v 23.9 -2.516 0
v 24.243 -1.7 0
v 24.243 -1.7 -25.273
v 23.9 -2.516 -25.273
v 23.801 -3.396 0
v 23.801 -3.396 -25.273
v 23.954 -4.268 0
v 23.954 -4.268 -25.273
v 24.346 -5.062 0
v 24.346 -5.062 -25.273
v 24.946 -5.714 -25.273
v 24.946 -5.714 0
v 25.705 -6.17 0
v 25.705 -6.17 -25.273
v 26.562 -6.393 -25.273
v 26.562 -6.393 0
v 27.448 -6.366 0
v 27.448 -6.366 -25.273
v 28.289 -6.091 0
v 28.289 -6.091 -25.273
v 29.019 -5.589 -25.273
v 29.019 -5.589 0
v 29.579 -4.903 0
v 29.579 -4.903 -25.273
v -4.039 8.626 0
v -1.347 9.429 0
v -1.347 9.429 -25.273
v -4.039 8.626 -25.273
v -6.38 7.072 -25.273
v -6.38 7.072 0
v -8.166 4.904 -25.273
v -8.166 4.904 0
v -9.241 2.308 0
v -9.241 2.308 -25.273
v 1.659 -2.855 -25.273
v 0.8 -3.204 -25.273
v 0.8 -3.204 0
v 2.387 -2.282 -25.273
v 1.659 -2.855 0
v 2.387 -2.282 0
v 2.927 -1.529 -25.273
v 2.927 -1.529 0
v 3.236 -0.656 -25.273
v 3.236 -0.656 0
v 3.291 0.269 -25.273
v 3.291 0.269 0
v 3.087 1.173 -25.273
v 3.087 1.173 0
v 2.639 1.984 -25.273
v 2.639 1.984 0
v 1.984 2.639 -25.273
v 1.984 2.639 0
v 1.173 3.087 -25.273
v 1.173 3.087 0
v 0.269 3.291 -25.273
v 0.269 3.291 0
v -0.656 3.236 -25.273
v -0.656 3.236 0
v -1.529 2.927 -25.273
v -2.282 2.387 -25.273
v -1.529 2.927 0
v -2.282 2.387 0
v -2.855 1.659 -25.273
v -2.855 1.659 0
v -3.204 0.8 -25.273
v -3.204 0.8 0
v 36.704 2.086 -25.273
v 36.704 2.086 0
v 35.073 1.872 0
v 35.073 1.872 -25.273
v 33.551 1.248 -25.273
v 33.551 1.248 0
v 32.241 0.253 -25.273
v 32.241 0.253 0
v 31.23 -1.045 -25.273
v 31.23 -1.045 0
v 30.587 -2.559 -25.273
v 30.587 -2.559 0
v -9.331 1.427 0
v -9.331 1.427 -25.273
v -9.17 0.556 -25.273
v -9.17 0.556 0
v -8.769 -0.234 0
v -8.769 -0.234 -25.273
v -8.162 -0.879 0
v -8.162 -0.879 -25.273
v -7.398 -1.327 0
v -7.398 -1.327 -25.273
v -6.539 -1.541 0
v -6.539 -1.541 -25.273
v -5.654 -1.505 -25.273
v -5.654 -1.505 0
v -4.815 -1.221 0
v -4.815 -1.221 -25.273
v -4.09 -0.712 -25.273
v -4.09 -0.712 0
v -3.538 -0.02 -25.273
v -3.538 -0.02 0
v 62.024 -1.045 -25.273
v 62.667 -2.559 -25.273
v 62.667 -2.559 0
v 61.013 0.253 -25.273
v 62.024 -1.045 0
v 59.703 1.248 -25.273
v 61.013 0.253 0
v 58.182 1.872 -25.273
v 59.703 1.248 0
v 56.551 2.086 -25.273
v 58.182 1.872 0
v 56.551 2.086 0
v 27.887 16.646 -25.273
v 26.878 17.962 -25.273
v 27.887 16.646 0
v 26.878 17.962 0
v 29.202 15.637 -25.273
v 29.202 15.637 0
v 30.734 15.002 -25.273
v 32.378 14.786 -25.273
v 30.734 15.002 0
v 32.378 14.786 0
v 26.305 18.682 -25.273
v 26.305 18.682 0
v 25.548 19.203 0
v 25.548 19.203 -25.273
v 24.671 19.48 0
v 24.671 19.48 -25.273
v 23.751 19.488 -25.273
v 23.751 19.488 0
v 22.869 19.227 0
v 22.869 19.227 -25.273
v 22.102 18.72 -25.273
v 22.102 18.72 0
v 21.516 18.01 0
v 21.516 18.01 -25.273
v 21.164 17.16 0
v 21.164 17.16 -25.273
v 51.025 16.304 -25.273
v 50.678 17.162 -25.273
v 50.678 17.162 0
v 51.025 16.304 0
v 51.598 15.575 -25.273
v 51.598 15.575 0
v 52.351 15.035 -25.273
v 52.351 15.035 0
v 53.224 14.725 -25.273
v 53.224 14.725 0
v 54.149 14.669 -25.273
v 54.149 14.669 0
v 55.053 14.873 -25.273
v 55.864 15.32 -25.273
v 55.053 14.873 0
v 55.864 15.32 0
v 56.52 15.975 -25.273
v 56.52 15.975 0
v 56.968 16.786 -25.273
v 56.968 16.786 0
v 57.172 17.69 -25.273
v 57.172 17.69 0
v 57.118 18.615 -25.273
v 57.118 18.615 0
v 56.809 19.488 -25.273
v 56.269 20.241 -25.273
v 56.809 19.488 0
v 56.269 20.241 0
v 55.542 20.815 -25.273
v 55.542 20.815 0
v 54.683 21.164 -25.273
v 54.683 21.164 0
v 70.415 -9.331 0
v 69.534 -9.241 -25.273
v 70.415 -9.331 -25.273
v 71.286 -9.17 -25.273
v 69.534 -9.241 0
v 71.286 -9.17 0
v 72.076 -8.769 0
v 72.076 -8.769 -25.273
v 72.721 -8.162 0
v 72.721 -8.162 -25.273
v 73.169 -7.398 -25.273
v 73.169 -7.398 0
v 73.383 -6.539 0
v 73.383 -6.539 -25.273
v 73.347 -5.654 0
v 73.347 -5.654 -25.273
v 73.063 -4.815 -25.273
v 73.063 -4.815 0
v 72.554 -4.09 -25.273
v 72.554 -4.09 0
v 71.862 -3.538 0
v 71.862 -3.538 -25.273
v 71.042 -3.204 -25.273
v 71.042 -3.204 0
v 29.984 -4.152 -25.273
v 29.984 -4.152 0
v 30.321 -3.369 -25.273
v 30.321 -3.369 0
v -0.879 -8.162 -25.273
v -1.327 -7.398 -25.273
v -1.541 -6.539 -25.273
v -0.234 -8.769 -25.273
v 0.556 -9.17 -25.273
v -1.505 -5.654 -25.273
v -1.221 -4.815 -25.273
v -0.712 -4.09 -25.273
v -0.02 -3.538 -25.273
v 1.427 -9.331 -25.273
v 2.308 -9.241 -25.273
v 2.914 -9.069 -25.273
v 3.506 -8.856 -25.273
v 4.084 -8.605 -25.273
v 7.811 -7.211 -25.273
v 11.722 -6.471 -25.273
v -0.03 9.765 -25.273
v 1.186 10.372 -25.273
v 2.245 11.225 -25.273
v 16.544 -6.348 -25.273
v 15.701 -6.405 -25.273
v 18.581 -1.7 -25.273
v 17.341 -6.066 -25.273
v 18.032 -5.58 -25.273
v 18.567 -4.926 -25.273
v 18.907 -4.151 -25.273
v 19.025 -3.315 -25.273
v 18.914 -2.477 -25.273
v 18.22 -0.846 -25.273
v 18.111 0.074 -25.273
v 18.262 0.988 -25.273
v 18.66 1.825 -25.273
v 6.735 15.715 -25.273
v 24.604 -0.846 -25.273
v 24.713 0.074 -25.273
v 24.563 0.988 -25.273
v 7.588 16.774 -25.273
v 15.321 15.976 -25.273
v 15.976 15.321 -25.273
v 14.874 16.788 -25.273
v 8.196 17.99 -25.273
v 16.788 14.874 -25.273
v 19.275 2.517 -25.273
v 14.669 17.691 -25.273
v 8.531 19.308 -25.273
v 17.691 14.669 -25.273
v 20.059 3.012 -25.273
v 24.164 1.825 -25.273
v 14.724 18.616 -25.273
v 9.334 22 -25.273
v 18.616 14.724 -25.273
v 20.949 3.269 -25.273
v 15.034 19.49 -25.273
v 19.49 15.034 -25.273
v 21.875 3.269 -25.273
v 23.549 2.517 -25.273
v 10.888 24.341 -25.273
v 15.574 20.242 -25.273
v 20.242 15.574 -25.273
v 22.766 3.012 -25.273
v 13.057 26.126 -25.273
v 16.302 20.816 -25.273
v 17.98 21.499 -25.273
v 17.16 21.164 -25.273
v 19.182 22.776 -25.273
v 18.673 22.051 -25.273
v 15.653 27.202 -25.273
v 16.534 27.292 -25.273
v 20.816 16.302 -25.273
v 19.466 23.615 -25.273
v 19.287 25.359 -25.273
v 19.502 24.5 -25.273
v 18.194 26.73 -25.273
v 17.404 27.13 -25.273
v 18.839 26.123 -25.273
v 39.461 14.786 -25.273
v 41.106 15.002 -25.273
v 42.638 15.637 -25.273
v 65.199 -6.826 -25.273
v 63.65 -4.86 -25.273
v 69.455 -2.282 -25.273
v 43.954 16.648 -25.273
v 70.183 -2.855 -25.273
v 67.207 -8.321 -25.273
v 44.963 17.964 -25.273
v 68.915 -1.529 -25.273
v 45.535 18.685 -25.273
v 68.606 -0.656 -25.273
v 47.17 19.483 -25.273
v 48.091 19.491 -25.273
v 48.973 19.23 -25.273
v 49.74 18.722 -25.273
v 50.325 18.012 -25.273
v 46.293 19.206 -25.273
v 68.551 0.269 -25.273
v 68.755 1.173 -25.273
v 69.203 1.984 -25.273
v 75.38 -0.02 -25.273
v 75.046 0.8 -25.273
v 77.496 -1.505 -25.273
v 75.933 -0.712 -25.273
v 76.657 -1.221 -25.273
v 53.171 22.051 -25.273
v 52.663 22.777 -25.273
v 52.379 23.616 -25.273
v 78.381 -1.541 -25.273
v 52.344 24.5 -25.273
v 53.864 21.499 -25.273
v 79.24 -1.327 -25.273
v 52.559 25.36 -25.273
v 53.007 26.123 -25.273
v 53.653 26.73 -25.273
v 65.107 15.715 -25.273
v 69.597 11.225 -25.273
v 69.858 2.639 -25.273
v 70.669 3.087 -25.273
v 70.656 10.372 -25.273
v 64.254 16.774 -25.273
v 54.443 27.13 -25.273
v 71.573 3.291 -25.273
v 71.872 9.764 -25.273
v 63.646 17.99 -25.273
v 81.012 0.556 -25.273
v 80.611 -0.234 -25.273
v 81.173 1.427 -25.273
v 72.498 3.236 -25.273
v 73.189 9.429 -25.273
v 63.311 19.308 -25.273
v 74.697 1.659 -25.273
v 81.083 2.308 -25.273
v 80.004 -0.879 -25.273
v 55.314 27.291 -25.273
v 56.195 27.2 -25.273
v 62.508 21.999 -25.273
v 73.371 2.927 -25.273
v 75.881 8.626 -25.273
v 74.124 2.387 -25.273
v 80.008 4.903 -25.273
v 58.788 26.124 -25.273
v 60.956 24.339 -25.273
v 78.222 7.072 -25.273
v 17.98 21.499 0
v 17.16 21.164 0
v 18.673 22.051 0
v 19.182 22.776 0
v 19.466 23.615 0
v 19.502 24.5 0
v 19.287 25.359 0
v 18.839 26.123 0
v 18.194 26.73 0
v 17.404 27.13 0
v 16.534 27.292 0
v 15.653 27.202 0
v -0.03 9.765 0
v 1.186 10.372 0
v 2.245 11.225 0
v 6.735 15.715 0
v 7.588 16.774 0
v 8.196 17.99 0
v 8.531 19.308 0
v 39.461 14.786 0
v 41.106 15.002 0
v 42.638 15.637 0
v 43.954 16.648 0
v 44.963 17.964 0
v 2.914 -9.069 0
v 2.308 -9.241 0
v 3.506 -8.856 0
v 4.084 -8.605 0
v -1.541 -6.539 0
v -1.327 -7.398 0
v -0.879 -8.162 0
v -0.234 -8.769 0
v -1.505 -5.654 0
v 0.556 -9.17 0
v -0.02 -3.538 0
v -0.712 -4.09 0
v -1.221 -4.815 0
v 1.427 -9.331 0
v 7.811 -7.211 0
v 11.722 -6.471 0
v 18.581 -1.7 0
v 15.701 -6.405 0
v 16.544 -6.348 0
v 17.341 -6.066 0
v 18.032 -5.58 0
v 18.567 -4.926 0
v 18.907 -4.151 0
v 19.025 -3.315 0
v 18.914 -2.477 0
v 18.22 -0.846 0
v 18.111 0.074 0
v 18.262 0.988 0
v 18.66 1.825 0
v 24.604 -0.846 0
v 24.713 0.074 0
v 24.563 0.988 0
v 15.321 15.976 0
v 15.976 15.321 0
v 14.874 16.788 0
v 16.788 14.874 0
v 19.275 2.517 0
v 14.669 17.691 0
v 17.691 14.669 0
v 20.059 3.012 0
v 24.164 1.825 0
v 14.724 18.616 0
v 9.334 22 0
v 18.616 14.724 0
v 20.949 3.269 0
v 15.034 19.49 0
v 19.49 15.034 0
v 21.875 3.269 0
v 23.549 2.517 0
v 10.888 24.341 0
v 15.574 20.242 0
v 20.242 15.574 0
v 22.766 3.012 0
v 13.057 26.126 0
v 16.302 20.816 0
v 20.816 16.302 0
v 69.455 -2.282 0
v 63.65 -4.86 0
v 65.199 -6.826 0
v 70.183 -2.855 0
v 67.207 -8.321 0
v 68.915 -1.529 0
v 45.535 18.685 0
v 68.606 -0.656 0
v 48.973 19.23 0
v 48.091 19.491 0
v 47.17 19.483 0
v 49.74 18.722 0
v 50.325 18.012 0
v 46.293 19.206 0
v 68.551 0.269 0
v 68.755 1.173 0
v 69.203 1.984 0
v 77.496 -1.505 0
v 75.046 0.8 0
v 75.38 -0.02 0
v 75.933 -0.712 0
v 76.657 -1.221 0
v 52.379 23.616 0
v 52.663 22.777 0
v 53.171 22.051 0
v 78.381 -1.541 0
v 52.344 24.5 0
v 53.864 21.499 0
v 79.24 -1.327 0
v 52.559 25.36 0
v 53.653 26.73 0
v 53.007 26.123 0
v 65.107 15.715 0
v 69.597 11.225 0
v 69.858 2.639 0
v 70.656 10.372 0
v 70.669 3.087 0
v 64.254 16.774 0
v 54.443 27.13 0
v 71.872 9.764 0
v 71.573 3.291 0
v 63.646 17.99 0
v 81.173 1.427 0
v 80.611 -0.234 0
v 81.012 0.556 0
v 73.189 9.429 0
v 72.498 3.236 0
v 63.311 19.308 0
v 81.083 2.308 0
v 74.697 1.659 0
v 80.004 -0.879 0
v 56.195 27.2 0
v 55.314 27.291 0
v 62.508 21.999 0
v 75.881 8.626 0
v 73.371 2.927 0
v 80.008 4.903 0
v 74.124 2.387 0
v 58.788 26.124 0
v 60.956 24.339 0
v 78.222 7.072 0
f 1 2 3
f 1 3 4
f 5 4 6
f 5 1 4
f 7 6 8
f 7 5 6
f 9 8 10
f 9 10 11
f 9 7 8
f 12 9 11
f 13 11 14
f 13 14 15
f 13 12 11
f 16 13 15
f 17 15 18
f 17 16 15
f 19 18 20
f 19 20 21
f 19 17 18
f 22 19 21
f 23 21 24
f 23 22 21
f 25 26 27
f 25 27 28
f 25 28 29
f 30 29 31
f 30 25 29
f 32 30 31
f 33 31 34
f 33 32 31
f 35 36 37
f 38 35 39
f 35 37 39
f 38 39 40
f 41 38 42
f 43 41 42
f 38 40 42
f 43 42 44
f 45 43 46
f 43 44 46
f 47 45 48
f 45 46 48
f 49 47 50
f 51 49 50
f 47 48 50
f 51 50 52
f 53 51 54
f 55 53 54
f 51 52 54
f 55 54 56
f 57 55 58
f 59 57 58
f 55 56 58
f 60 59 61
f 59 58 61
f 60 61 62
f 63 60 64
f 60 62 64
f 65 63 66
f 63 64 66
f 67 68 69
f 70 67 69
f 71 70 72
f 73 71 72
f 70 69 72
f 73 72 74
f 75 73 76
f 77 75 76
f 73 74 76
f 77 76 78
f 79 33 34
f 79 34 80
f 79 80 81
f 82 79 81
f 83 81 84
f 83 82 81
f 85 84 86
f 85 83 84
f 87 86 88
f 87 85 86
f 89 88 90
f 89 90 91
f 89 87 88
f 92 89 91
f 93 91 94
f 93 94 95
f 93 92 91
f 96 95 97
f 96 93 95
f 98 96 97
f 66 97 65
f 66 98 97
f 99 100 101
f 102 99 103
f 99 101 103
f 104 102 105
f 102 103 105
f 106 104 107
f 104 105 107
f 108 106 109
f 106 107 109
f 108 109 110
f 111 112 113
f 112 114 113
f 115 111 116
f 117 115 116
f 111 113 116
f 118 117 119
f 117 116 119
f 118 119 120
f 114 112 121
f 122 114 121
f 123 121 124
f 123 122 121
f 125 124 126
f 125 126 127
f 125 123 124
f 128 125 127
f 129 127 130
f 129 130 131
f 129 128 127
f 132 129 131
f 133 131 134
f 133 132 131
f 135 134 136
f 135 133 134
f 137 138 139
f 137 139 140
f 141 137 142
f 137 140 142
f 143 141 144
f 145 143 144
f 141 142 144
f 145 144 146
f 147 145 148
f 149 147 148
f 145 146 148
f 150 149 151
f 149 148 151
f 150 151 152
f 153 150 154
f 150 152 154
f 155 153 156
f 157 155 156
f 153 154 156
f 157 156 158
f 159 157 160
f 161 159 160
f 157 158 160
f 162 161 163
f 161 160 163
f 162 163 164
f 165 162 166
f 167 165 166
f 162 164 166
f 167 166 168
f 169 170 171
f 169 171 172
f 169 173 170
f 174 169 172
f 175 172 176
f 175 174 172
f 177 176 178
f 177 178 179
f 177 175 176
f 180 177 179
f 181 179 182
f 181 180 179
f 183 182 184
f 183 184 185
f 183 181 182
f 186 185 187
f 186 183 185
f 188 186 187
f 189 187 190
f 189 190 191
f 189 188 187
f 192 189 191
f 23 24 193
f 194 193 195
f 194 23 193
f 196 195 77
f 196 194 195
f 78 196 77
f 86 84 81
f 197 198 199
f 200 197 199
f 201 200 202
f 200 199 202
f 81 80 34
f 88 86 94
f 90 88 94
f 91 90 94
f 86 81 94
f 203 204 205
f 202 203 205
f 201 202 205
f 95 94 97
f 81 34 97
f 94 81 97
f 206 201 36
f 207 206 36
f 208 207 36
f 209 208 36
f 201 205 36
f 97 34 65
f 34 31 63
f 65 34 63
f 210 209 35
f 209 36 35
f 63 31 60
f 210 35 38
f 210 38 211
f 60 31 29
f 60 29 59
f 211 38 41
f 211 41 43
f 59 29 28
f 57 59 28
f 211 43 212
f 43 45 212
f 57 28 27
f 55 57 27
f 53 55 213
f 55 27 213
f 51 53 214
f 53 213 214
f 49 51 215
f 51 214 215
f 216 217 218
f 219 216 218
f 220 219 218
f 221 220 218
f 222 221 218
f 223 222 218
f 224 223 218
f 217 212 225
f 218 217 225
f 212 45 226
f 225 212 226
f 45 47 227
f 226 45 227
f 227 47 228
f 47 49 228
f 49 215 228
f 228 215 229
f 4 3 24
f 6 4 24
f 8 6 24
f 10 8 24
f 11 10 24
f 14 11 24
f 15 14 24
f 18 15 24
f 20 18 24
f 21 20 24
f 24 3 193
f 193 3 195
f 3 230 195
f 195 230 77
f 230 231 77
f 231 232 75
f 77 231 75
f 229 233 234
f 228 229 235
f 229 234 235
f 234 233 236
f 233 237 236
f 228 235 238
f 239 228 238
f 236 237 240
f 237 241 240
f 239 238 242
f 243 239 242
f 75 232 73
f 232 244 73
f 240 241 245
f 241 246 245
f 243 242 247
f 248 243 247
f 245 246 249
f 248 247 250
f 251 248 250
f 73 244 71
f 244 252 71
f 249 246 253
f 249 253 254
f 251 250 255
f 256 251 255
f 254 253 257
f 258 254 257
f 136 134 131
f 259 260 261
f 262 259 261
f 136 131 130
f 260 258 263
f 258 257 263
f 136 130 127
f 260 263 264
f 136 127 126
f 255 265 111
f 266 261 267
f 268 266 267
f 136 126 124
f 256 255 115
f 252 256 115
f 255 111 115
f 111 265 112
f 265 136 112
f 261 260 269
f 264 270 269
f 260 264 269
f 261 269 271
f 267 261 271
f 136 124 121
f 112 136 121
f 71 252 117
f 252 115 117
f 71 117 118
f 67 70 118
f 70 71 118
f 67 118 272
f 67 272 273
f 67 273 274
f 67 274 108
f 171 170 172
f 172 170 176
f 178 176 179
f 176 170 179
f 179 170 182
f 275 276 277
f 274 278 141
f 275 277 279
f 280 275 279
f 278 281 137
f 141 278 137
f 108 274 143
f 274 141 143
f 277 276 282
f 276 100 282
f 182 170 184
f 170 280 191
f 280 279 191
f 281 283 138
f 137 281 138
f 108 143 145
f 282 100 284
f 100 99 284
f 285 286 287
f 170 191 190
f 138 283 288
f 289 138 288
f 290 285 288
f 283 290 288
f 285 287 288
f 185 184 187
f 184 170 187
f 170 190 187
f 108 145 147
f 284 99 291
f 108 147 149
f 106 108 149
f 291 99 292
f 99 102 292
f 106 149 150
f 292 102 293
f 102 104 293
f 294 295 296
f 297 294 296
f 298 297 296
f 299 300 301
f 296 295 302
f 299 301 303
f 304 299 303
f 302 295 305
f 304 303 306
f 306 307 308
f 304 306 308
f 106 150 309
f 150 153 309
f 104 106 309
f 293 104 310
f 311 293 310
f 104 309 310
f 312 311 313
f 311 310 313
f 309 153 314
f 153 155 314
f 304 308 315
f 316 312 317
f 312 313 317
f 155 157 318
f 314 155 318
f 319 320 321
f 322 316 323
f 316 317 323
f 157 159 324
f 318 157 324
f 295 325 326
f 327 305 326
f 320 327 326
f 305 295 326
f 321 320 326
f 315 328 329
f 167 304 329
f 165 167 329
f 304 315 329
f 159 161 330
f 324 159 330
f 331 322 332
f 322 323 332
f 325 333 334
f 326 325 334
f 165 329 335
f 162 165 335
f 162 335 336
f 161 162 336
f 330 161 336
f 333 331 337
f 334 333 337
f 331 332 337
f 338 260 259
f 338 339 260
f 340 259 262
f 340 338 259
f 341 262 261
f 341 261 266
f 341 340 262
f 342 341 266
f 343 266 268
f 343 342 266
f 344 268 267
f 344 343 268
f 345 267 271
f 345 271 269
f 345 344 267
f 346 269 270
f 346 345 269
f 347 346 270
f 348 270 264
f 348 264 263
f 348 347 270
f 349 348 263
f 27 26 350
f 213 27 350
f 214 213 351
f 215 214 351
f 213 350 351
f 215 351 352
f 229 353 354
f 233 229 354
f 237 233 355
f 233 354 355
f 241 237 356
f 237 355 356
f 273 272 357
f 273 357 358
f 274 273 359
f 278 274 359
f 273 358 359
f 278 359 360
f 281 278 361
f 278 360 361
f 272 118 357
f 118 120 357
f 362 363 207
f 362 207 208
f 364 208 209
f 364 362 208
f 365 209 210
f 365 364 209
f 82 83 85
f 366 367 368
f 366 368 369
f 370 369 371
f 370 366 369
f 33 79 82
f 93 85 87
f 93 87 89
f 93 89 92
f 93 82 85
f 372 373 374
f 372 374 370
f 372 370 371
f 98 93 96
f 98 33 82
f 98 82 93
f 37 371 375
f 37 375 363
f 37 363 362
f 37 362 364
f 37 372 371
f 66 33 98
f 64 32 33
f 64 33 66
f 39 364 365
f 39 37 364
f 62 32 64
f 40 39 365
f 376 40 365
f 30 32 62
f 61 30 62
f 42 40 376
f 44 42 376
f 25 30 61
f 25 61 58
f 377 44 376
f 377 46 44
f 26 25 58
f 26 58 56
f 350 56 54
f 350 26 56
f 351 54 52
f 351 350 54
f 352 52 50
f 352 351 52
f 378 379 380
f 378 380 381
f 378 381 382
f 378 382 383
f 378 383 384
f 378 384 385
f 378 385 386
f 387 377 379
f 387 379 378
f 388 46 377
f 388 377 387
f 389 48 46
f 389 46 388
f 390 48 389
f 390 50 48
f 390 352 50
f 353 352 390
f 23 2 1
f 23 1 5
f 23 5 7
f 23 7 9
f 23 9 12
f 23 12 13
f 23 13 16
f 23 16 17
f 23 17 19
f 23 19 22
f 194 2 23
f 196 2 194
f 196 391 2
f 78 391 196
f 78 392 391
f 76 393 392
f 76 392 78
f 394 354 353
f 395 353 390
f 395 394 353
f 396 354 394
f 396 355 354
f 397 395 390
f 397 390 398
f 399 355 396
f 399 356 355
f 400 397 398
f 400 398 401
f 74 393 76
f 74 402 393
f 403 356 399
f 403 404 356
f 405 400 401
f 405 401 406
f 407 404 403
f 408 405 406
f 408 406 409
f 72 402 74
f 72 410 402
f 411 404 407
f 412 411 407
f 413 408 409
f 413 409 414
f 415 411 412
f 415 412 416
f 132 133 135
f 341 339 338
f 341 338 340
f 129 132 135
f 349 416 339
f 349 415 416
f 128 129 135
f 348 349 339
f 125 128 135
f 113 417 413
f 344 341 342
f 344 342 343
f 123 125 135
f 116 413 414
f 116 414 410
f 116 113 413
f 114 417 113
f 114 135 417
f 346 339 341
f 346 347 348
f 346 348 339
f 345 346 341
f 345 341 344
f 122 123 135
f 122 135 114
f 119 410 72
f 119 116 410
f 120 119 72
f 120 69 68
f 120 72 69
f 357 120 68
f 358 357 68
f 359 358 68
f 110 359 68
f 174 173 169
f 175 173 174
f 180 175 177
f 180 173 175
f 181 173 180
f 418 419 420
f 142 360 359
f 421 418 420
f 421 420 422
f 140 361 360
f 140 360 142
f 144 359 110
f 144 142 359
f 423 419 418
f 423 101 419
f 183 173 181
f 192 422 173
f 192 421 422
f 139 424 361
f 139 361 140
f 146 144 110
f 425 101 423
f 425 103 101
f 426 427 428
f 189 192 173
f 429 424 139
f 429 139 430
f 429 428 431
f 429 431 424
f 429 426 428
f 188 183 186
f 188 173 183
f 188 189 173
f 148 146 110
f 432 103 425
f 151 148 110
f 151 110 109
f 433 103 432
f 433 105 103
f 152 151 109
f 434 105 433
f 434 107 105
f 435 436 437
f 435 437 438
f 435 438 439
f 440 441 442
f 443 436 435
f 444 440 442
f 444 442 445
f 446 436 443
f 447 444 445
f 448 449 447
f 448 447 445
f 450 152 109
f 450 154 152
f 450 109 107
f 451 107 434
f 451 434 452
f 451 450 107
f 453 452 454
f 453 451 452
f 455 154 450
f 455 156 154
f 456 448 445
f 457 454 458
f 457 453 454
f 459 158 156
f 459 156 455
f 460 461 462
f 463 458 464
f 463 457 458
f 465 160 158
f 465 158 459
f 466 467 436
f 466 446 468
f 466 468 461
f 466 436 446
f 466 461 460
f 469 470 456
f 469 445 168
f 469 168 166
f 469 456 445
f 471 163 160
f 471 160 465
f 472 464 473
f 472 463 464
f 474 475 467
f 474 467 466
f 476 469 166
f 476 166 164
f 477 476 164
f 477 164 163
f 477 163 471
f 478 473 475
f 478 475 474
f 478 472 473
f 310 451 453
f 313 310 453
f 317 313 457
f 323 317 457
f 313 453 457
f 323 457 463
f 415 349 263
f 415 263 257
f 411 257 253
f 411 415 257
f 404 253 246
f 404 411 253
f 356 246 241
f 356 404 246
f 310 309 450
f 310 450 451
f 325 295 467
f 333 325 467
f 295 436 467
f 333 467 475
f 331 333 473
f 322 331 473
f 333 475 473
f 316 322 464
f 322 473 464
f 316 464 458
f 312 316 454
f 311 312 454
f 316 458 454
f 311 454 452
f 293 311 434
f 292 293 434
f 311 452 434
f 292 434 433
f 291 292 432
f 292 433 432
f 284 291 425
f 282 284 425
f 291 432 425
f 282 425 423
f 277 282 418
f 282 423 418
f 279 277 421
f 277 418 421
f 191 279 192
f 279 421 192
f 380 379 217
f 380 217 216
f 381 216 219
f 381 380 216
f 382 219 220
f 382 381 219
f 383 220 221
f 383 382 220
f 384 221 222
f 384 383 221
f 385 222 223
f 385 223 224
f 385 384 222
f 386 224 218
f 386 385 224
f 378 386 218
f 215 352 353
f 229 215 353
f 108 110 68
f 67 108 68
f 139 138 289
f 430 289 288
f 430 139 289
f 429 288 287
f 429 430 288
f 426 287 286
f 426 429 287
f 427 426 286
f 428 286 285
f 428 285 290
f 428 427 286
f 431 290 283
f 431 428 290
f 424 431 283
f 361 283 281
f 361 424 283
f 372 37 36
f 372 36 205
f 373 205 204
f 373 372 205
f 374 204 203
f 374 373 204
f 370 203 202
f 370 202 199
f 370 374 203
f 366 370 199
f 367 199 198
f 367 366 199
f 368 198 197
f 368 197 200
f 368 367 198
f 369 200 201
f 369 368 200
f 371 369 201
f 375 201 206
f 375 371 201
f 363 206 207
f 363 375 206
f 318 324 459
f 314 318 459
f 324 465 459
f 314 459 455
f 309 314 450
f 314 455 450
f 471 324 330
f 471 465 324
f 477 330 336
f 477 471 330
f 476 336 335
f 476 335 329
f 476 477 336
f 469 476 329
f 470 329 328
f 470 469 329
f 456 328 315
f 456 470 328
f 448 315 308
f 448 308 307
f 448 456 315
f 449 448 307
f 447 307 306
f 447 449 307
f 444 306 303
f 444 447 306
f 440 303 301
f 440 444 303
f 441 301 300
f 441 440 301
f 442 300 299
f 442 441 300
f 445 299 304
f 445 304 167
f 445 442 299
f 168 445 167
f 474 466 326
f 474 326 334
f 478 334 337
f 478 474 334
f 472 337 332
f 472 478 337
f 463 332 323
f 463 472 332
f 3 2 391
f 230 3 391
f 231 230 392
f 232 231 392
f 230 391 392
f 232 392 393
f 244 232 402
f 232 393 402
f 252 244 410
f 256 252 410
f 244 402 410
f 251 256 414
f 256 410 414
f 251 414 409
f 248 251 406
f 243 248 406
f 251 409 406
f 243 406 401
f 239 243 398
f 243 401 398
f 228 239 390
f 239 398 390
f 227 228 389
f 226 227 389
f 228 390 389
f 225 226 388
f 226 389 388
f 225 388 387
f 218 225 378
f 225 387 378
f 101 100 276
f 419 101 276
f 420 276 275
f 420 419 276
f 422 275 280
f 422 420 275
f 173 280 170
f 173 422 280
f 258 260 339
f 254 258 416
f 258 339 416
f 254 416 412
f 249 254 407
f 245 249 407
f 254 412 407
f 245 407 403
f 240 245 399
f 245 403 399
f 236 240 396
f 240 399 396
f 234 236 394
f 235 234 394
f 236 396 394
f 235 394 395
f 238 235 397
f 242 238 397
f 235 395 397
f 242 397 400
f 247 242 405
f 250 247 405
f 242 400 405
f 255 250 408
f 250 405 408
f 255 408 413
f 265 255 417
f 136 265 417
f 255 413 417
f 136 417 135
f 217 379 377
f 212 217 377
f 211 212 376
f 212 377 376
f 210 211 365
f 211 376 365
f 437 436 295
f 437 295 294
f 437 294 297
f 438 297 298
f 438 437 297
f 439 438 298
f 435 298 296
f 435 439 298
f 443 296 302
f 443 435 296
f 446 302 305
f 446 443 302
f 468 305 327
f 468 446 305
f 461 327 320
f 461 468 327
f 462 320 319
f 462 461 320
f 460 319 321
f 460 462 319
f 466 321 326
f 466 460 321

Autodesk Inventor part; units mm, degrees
ref_plane "YZ Plane" through (0, 0, 0) normal (1, 0, 0) x (0, 1, 0)
ref_plane "XZ Plane" through (0, 0, 0) normal (0, 1, 0) x (-1, 0, 0)
ref_plane "XY Plane" through (0, 0, 0) normal (0, 0, 1) x (1, 0, 0)
sketch "Sketch1" plane through (0, 0, 0) normal (0, 0, 1) x (1, 0, 0)
  arc A0 (63.3108, 19.3076) -> (65.1069, 15.7154) centre (69.597, 20.2056) ccw
  arc A1 (63.3108, 19.3076) -> (56.1947, 27.2004) centre (53.8815, 17.9605) ccw
  arc A2 (56.1947, 27.2004) -> (54.6834, 21.1637) centre (55.439, 24.182) ccw
  arc A3 (50.6775, 17.1623) -> (54.6834, 21.1637) centre (53.8815, 17.9605) ccw
  arc A4 (50.6775, 17.1623) -> (44.9626, 17.9641) centre (47.6583, 16.4101) ccw
  arc A5 (39.4613, 14.7855) -> (44.9626, 17.9641) centre (39.4613, 21.1355) ccw
  line L0 (32.3778, 14.7855) -> (39.4613, 14.7855)
  arc A6 (26.8779, 17.9617) -> (32.3778, 14.7855) centre (32.3778, 21.1355) ccw
  arc A7 (26.8779, 17.9617) -> (21.1641, 17.1604) centre (24.1829, 16.4065) ccw
  arc A8 (17.1604, 21.1641) -> (21.1641, 17.1604) centre (17.9605, 17.9605) ccw
  arc A9 (17.1604, 21.1641) -> (15.6526, 27.2017) centre (16.4065, 24.1829) ccw
  arc A10 (15.6526, 27.2017) -> (8.5312, 19.3076) centre (17.9605, 17.9605) ccw
  arc A11 (6.7352, 15.7154) -> (8.5312, 19.3076) centre (2.2451, 20.2056) ccw
  line L1 (2.2451, 11.2253) -> (6.7352, 15.7154)
  arc A12 (-1.347, 9.4293) -> (2.2451, 11.2253) centre (-2.2451, 15.7154) ccw
  arc A13 (-1.347, 9.4293) -> (-9.2412, 2.3079) centre (0, 0) ccw
  arc A14 (-9.2412, 2.3079) -> (-3.2036, 0.8001) centre (-6.2224, 1.554) ccw
  arc A15 (0.8001, -3.2036) -> (-3.2036, 0.8001) centre (0, 0) ccw
  arc A16 (0.8001, -3.2036) -> (2.3079, -9.2412) centre (1.554, -6.2224) ccw
  arc A17 (2.3079, -9.2412) -> (4.0839, -8.6051) centre (0, 0) ccw
  arc A18 (15.7006, -6.4053) -> (4.0839, -8.6051) centre (14.0949, -29.6986) ccw
  arc A19 (15.7006, -6.4053) -> (18.5812, -1.6996) centre (15.9135, -3.3011) ccw
  arc A20 (24.2432, -1.6996) -> (18.5812, -1.6996) centre (21.4122, 0) ccw
  arc A21 (24.2432, -1.6996) -> (29.5786, -4.9026) centre (26.9109, -3.3011) ccw
  arc A22 (29.5786, -4.9026) -> (30.5871, -2.5587) centre (21.4122, 0) ccw
  arc A23 (36.7037, 2.0855) -> (30.5871, -2.5587) centre (36.7037, -4.2645) ccw
  line L2 (56.5506, 2.0855) -> (36.7037, 2.0855)
  arc A24 (62.6672, -2.5587) -> (56.5506, 2.0855) centre (56.5506, -4.2645) ccw
  arc A25 (62.6672, -2.5587) -> (69.5342, -9.2412) centre (71.842, 0) ccw
  arc A26 (69.5342, -9.2412) -> (71.042, -3.2036) centre (70.2881, -6.2224) ccw
  arc A27 (75.0457, 0.8001) -> (71.042, -3.2036) centre (71.842, 0) ccw
  arc A28 (75.0457, 0.8001) -> (81.0832, 2.3079) centre (78.0644, 1.554) ccw
  arc A29 (81.0832, 2.3079) -> (73.1891, 9.4293) centre (71.842, 0) ccw
  arc A30 (69.597, 11.2253) -> (73.1891, 9.4293) centre (74.0871, 15.7154) ccw
  line L3 (65.1069, 15.7154) -> (69.597, 11.2253)
extrude "Extrusion1" add sketch "Sketch1" against normal blind 25.273
properties part number "am-0212" material "Aluminum-6061"
